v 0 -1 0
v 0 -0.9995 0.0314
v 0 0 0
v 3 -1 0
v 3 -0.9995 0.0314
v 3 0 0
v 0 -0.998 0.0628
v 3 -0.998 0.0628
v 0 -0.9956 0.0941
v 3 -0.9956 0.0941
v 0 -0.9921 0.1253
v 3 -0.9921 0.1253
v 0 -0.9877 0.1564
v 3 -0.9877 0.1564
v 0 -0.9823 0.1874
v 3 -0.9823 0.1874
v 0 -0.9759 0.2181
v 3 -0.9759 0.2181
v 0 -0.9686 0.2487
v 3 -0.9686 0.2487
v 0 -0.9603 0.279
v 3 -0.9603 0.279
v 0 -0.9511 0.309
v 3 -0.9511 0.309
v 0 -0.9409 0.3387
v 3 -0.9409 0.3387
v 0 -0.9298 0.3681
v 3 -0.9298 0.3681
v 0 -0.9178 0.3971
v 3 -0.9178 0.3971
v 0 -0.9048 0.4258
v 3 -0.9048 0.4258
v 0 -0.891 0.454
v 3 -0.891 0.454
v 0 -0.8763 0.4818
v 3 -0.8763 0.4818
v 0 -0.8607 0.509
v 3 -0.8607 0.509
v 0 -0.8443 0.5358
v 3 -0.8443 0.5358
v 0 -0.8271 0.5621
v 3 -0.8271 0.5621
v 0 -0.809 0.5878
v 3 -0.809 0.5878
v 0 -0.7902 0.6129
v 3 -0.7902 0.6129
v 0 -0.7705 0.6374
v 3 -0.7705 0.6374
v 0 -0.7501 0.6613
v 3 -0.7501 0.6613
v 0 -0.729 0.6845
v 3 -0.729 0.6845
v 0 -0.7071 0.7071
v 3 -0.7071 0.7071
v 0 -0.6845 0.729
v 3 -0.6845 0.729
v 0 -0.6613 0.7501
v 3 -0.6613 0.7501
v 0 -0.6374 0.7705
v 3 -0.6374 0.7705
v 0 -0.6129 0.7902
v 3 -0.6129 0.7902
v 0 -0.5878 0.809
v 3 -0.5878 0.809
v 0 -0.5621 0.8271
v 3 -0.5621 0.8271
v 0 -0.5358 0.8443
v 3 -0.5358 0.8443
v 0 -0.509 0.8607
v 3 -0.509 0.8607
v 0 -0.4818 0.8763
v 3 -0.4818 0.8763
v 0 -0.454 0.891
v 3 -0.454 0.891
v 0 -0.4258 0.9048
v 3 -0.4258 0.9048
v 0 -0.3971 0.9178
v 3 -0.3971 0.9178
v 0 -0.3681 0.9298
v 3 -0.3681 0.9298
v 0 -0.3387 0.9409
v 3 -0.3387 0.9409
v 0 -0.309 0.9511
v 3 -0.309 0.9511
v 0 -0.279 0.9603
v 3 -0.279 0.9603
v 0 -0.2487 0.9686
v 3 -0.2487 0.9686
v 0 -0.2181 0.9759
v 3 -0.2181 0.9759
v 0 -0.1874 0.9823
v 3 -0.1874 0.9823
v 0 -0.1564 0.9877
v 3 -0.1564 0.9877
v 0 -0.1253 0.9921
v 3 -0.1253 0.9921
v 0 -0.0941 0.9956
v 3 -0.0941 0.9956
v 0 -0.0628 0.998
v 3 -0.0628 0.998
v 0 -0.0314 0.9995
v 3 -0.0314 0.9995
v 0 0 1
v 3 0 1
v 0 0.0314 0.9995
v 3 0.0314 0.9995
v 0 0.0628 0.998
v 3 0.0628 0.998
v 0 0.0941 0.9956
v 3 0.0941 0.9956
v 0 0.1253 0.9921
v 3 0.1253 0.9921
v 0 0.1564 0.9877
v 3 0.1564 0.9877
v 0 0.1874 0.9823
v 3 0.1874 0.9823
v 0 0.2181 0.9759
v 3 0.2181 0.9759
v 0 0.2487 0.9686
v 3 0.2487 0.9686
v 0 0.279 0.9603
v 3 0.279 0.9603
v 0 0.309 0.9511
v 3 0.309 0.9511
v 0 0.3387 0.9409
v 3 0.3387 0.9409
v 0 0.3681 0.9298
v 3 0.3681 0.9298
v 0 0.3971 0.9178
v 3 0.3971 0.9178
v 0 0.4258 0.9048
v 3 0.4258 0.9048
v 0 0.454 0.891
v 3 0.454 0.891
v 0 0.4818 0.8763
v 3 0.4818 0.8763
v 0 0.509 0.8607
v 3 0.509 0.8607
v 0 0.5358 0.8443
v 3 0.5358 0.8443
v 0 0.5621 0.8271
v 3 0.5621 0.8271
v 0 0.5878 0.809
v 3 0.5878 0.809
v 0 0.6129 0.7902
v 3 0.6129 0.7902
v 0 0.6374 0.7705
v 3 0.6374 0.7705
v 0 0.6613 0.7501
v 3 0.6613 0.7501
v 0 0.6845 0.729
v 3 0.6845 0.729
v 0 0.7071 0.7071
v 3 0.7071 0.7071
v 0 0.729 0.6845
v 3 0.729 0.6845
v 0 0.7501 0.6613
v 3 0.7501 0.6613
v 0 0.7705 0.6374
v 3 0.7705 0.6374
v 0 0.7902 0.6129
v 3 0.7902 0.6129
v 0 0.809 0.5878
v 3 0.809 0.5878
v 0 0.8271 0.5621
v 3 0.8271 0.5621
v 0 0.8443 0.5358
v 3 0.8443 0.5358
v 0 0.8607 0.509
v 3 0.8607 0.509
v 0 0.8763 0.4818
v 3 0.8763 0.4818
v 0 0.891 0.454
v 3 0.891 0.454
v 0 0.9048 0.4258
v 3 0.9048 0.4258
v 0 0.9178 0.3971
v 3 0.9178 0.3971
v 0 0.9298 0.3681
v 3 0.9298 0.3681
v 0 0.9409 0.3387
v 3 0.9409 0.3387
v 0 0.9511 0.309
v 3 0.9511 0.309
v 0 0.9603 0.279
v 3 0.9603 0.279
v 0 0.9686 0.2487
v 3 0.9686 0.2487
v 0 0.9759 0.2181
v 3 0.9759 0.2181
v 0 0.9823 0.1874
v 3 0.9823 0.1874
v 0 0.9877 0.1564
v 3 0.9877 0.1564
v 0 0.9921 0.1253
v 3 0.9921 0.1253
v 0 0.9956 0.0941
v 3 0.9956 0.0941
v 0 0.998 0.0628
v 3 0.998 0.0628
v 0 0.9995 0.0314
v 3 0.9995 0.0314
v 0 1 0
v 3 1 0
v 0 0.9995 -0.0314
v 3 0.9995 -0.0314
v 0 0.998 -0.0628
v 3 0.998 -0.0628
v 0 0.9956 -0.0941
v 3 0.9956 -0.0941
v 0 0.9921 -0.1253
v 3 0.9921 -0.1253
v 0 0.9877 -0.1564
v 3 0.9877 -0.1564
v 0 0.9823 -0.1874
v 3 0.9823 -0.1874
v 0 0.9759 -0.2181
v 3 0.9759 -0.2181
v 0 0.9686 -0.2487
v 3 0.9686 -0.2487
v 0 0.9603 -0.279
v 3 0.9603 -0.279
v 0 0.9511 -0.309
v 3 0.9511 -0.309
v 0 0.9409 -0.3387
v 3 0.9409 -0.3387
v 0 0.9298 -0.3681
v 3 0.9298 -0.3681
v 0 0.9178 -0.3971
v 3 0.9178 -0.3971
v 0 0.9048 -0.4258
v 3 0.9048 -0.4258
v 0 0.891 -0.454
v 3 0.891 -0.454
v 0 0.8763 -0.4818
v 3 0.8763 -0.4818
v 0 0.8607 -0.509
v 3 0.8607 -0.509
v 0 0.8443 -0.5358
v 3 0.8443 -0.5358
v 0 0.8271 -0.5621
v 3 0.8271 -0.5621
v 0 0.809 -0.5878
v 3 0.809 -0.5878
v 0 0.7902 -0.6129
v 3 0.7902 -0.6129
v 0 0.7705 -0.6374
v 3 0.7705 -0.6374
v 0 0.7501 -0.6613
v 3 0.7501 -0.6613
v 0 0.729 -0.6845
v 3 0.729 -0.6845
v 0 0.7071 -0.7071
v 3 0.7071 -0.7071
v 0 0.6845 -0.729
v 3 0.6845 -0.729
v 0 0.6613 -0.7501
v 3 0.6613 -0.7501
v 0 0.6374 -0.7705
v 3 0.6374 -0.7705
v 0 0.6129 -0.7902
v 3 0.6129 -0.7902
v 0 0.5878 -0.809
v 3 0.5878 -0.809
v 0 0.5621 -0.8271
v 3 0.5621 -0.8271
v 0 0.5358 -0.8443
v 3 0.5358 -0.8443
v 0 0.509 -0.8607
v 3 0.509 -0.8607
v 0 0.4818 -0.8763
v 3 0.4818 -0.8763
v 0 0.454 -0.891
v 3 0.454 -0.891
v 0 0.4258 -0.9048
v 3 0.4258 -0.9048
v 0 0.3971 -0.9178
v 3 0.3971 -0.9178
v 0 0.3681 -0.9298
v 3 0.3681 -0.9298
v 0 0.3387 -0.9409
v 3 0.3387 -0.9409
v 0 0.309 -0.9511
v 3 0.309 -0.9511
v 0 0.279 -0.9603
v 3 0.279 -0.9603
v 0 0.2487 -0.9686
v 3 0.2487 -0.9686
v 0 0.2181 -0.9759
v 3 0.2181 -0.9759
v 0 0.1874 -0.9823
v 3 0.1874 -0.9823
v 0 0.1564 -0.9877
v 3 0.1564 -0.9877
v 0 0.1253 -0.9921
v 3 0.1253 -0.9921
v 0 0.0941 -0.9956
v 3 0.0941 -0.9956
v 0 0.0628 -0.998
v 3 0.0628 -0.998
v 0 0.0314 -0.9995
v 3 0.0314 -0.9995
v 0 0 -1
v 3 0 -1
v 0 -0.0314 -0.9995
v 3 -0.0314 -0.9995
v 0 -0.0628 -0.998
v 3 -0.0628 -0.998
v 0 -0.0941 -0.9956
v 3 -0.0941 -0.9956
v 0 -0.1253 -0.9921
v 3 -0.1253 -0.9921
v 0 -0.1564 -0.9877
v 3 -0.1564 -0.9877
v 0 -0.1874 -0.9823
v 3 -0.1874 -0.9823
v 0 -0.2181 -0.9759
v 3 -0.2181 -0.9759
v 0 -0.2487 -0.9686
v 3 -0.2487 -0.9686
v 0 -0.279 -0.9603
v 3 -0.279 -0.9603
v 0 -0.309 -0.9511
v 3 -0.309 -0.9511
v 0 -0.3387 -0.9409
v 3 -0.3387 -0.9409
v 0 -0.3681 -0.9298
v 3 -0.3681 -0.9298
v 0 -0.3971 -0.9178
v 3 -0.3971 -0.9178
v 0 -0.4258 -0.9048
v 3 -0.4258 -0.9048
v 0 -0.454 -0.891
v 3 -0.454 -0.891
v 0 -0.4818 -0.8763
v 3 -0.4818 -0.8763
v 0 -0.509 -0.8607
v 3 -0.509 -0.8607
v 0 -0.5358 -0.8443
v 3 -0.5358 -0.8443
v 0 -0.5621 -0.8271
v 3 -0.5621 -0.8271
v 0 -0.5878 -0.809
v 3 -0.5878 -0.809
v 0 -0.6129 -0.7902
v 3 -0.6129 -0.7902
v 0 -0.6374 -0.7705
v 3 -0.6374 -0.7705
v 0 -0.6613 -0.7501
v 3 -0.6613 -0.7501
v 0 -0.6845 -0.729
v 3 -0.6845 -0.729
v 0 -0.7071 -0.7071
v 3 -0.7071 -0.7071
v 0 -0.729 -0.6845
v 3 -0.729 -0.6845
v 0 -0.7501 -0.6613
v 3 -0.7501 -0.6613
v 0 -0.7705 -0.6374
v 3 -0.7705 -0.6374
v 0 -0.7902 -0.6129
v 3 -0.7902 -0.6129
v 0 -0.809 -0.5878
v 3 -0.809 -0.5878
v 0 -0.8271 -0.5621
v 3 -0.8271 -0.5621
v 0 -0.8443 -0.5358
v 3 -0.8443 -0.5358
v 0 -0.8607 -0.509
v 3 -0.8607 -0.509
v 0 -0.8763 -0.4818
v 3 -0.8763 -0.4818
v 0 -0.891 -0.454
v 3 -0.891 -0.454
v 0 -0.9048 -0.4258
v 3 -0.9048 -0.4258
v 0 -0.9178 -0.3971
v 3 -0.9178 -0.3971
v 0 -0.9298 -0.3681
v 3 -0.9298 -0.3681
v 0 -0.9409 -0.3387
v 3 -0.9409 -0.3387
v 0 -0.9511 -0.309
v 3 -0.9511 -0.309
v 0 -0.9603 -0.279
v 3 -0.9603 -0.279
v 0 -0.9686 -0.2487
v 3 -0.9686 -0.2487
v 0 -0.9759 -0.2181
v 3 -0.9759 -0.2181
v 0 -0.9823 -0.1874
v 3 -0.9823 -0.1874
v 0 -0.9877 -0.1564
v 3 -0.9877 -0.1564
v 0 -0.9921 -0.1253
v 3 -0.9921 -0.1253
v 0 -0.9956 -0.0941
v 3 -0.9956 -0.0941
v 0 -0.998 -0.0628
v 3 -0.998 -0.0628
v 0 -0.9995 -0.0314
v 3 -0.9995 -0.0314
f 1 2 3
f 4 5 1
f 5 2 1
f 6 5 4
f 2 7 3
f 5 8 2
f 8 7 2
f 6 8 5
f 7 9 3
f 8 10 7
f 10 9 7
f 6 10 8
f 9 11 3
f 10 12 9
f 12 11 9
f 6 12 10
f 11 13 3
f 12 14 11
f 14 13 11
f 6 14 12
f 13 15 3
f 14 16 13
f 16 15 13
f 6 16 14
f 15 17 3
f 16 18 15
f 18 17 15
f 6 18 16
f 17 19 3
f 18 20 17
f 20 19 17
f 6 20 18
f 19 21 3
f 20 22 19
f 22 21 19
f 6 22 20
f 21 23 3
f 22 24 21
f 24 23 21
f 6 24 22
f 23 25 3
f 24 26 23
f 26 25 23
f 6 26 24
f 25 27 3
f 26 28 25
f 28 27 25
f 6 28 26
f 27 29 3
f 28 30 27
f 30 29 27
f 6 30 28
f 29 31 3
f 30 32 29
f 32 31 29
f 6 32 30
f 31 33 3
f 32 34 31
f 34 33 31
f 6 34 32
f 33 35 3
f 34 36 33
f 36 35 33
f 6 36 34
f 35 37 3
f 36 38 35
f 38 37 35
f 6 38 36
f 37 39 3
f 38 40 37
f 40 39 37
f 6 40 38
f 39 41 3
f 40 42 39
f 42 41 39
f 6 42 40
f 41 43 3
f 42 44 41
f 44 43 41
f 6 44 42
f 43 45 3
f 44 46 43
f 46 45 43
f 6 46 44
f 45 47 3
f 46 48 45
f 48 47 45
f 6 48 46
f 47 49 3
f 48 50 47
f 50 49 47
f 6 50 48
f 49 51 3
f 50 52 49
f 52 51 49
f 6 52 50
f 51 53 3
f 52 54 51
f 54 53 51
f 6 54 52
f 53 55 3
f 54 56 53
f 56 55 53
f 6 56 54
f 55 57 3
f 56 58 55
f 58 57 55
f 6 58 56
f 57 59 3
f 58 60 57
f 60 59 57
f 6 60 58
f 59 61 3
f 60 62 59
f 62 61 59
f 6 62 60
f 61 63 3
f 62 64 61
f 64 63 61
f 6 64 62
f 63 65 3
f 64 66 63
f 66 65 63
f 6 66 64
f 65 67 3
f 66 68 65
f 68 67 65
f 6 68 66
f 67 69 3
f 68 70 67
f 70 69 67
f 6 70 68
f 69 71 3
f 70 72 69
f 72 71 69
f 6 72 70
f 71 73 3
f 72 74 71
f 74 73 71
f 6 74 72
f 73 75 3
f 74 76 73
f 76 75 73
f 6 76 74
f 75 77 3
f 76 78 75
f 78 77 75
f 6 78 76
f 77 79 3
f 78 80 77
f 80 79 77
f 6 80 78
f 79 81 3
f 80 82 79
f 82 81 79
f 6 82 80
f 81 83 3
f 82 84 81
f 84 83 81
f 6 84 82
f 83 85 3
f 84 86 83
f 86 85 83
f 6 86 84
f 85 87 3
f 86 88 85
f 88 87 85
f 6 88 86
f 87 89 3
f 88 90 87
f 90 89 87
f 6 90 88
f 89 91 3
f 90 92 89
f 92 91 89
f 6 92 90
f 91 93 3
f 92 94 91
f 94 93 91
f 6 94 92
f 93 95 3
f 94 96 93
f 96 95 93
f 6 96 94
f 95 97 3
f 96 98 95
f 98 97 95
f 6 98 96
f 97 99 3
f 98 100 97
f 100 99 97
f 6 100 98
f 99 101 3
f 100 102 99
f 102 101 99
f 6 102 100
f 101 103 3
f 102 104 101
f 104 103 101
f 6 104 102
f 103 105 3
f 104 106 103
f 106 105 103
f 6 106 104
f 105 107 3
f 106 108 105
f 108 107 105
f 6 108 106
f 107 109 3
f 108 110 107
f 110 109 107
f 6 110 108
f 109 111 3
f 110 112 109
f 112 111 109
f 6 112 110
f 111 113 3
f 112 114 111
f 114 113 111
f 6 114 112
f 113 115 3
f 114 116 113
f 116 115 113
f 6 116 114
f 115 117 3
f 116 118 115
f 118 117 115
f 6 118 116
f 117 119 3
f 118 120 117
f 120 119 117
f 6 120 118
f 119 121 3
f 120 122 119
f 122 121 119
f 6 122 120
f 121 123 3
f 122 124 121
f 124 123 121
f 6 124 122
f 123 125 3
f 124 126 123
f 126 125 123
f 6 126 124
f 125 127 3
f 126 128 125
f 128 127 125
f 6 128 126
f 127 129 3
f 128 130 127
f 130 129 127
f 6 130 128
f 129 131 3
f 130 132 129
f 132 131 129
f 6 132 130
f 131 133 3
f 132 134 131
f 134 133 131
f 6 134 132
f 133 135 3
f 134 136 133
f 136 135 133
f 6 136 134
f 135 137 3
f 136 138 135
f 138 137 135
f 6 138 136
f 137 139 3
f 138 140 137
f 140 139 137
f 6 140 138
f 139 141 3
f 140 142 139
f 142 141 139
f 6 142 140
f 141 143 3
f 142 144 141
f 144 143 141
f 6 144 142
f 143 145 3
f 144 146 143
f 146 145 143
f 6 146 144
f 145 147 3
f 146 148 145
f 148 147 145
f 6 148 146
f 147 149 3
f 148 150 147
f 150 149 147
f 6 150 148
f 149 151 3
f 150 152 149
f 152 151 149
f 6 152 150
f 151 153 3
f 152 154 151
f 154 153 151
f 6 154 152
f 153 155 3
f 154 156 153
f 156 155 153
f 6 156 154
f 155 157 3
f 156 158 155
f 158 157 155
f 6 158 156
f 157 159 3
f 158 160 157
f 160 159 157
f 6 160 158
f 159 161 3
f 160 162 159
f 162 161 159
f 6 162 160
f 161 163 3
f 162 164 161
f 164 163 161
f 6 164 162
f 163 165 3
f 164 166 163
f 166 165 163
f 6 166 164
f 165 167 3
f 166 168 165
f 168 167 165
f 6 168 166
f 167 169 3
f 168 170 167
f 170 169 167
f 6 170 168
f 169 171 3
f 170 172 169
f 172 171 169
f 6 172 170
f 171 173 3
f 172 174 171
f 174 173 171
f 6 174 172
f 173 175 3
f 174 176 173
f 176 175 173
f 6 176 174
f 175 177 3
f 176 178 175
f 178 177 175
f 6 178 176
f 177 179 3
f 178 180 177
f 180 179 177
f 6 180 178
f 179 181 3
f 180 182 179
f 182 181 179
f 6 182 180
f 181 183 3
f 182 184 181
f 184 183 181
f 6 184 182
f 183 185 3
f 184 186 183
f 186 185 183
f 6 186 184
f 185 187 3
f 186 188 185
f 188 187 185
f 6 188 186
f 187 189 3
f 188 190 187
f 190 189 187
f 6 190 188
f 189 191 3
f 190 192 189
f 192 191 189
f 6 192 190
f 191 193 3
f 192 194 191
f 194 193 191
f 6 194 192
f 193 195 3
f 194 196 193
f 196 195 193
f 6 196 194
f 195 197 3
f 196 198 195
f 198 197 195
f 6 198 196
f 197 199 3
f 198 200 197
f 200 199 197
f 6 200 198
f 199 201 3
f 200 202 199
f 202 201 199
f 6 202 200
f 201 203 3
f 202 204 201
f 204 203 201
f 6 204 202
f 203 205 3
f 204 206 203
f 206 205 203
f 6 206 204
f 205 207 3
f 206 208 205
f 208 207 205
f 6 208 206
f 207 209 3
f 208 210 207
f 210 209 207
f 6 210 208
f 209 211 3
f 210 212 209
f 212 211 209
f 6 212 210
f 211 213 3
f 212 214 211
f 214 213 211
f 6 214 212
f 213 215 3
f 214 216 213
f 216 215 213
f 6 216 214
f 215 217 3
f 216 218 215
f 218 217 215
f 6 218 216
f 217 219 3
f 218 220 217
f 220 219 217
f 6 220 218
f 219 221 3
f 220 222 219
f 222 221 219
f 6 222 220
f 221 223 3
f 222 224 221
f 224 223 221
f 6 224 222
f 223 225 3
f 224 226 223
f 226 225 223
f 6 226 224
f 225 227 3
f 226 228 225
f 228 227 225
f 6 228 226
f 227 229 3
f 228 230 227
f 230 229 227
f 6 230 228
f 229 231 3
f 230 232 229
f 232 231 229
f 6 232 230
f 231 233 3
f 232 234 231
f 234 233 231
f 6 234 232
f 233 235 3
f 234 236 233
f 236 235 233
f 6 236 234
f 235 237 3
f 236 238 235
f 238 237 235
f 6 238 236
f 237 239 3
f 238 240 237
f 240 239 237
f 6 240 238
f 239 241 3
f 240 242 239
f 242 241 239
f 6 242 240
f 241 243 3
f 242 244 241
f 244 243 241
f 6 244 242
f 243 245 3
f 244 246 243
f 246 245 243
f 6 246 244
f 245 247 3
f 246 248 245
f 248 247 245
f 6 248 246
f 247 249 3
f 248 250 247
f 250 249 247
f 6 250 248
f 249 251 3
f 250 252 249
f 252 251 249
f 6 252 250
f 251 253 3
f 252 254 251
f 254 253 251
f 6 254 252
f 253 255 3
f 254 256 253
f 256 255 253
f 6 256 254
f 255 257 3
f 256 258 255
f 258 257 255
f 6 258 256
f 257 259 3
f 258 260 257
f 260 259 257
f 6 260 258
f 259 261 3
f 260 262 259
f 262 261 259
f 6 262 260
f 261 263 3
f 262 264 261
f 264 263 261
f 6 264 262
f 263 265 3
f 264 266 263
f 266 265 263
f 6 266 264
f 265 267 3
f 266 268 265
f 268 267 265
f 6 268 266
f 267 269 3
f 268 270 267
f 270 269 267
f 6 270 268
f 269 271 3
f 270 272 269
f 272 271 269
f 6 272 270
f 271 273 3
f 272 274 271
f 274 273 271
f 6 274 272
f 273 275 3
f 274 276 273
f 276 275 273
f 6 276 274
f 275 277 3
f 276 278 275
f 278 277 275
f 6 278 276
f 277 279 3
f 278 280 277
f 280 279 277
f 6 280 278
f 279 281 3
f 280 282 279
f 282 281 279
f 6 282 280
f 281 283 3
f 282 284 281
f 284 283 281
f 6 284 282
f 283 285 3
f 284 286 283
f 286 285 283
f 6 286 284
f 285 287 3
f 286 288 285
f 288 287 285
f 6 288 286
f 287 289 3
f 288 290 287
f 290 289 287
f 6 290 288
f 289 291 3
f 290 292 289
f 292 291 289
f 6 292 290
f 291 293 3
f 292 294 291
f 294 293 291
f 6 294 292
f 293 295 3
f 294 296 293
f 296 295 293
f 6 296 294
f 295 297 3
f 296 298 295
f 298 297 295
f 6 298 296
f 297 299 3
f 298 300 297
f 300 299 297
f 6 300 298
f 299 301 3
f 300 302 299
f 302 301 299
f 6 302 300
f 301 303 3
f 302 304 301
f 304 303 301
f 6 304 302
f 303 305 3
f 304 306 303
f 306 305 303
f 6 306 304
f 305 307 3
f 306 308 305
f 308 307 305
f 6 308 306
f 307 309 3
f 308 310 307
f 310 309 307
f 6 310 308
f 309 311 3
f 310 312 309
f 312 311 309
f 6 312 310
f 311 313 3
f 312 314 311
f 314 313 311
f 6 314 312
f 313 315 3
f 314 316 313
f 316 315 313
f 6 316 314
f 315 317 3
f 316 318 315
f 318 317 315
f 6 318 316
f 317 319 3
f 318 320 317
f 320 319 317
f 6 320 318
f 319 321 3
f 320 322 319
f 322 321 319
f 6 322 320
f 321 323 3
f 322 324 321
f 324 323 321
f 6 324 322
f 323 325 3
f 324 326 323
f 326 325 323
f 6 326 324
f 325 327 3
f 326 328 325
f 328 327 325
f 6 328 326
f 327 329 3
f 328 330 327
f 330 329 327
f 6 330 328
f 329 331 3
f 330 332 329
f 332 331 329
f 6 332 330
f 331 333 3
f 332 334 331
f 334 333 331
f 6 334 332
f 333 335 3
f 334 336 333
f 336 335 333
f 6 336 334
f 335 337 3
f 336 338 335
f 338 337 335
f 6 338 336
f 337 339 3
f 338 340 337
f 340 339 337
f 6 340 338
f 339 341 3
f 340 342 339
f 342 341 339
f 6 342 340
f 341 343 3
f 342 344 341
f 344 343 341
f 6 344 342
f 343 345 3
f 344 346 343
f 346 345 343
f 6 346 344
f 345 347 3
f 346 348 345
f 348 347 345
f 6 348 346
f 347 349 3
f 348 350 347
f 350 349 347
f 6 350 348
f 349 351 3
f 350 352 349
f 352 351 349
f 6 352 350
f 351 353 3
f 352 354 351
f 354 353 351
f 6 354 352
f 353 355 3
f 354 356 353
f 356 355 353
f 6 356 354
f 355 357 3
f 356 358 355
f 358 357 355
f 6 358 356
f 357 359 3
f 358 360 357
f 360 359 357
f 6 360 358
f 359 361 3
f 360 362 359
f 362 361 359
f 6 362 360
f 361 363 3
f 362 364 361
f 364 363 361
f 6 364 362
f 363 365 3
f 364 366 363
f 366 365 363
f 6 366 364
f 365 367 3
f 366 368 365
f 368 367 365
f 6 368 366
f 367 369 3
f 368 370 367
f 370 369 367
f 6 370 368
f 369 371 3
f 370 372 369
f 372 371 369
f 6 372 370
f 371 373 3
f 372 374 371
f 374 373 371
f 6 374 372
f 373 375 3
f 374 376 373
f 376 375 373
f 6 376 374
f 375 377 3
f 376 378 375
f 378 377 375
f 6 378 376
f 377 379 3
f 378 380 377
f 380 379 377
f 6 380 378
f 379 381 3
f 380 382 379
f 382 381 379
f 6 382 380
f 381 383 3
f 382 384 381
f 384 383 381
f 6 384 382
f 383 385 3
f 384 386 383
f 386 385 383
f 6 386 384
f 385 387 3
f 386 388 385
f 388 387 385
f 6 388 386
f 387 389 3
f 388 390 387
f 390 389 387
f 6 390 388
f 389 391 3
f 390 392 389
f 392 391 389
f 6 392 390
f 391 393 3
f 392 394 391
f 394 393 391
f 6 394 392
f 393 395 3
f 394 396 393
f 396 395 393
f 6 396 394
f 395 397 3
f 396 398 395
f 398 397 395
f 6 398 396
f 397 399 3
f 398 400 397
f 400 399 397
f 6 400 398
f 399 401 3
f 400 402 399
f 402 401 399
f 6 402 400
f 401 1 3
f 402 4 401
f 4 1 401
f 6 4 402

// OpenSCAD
// file: Revolve_Util.scad
//Concatanates to lists
function cat(L1, L2) = [for(L=[L1, L2], a=L) a] ;

// adds all the value in a list      
function add(v, i = 0, r = 0) = i < len(v) ? add(v, i + 1, r + v[i]) : r;
 
//Rotates a given point by theta in an anticlockwise direction (if theta is positive).
function rotate_point(theta=0, point = [0,0]) = 
    [point[0]*cos(theta) - point[1]*sin(theta),
     point[1]*cos(theta) + point[0]*sin(theta)];

function shell_area(point) = (PI*point[0])*point[0];

function shell_volume(point, dx) = shell_area(point)*dx;


function total_volume(points, dx) = add([for(z = points) shell_volume(points, dx)]);
  
   
//Revolves a polygon defined by an input array of points around the y axis.  
module revolve_around_x(input_points = [[0,0],[5,5],[10,0]], translation = [0,0]){
    
    // uncomment line below to view the functions graph
    // rotate([0,0,90]) polygon( points=generated_points )

    // Positions the solid so that it is centered around the x-axis, comment the below line out to revolve around the y-axis.
    
    echo(input_points);
    
    rotate([-90,0,-90])

    rotate_extrude($fn=200) 
    // The a 90 degree rotation around the z-axis lets this generate a revolved solid with equivalent to a revolve around the x-axis. Comment the below line out to revolve around the y-axis.
    rotate([0,0,90])
    
    translate(translation)
    
    polygon( points=input_points );
}


//Revolves a polygon defined by an input array of points around the y axis.
module revolve_around_y(input_points = [[0,0],[5,5],[10,0]], translation = [0,0]){
    
    // uncomment line below to view the functions graph
    //rotate([0,0,0]) polygon( points=generated_points )

    // Positions the solid so that it is centered around the x-axis, comment the below line out to revolve around the y-axis.
    
    echo(input_points);
    
    rotate([-90,0,0])

    rotate_extrude($fn=200) 
    // The a 90 degree rotation around the z-axis lets this generate a revolved solid with equivalent to a revolve around the x-axis. Comment the below line out to revolve around the y-axis.
    rotate([0,0,0])
    
    translate(translation)
    
    polygon( points=input_points );
}
// main file
include <Revolve_Util.scad>;


//Rotate Point Test

/*
$fn = 50;

translate([1,0]) circle(.25);

translate(rotate_point(90, [1,0])) circle(.25);

echo(rotate_point(90, [1,0]));
*/

// Shell volume test
x1 = 0;
x2 = 3;
step = 0.005;

function f(x) = 1;

function g(x) = 0;

fx_points = [for(l = [x1:step:x2]) rotate_point(0,[l, f(l)])];
gx_points = [for(k = [x2:-step:x1]) rotate_point(0, [k, g(k)])];

generated_points = fx_points;

revolve_around_x(cat(fx_points, [rotate_point(0,[x2,0]),rotate_point(0,[x1,0])]));
polygon(cat(fx_points, [[x2,0],[x1,0]]));

volume = total_volume(generated_points, dx = step);
echo("_____ Volume _____");

echo(volume);

echo(total_volume(generated_points, dx = step));
